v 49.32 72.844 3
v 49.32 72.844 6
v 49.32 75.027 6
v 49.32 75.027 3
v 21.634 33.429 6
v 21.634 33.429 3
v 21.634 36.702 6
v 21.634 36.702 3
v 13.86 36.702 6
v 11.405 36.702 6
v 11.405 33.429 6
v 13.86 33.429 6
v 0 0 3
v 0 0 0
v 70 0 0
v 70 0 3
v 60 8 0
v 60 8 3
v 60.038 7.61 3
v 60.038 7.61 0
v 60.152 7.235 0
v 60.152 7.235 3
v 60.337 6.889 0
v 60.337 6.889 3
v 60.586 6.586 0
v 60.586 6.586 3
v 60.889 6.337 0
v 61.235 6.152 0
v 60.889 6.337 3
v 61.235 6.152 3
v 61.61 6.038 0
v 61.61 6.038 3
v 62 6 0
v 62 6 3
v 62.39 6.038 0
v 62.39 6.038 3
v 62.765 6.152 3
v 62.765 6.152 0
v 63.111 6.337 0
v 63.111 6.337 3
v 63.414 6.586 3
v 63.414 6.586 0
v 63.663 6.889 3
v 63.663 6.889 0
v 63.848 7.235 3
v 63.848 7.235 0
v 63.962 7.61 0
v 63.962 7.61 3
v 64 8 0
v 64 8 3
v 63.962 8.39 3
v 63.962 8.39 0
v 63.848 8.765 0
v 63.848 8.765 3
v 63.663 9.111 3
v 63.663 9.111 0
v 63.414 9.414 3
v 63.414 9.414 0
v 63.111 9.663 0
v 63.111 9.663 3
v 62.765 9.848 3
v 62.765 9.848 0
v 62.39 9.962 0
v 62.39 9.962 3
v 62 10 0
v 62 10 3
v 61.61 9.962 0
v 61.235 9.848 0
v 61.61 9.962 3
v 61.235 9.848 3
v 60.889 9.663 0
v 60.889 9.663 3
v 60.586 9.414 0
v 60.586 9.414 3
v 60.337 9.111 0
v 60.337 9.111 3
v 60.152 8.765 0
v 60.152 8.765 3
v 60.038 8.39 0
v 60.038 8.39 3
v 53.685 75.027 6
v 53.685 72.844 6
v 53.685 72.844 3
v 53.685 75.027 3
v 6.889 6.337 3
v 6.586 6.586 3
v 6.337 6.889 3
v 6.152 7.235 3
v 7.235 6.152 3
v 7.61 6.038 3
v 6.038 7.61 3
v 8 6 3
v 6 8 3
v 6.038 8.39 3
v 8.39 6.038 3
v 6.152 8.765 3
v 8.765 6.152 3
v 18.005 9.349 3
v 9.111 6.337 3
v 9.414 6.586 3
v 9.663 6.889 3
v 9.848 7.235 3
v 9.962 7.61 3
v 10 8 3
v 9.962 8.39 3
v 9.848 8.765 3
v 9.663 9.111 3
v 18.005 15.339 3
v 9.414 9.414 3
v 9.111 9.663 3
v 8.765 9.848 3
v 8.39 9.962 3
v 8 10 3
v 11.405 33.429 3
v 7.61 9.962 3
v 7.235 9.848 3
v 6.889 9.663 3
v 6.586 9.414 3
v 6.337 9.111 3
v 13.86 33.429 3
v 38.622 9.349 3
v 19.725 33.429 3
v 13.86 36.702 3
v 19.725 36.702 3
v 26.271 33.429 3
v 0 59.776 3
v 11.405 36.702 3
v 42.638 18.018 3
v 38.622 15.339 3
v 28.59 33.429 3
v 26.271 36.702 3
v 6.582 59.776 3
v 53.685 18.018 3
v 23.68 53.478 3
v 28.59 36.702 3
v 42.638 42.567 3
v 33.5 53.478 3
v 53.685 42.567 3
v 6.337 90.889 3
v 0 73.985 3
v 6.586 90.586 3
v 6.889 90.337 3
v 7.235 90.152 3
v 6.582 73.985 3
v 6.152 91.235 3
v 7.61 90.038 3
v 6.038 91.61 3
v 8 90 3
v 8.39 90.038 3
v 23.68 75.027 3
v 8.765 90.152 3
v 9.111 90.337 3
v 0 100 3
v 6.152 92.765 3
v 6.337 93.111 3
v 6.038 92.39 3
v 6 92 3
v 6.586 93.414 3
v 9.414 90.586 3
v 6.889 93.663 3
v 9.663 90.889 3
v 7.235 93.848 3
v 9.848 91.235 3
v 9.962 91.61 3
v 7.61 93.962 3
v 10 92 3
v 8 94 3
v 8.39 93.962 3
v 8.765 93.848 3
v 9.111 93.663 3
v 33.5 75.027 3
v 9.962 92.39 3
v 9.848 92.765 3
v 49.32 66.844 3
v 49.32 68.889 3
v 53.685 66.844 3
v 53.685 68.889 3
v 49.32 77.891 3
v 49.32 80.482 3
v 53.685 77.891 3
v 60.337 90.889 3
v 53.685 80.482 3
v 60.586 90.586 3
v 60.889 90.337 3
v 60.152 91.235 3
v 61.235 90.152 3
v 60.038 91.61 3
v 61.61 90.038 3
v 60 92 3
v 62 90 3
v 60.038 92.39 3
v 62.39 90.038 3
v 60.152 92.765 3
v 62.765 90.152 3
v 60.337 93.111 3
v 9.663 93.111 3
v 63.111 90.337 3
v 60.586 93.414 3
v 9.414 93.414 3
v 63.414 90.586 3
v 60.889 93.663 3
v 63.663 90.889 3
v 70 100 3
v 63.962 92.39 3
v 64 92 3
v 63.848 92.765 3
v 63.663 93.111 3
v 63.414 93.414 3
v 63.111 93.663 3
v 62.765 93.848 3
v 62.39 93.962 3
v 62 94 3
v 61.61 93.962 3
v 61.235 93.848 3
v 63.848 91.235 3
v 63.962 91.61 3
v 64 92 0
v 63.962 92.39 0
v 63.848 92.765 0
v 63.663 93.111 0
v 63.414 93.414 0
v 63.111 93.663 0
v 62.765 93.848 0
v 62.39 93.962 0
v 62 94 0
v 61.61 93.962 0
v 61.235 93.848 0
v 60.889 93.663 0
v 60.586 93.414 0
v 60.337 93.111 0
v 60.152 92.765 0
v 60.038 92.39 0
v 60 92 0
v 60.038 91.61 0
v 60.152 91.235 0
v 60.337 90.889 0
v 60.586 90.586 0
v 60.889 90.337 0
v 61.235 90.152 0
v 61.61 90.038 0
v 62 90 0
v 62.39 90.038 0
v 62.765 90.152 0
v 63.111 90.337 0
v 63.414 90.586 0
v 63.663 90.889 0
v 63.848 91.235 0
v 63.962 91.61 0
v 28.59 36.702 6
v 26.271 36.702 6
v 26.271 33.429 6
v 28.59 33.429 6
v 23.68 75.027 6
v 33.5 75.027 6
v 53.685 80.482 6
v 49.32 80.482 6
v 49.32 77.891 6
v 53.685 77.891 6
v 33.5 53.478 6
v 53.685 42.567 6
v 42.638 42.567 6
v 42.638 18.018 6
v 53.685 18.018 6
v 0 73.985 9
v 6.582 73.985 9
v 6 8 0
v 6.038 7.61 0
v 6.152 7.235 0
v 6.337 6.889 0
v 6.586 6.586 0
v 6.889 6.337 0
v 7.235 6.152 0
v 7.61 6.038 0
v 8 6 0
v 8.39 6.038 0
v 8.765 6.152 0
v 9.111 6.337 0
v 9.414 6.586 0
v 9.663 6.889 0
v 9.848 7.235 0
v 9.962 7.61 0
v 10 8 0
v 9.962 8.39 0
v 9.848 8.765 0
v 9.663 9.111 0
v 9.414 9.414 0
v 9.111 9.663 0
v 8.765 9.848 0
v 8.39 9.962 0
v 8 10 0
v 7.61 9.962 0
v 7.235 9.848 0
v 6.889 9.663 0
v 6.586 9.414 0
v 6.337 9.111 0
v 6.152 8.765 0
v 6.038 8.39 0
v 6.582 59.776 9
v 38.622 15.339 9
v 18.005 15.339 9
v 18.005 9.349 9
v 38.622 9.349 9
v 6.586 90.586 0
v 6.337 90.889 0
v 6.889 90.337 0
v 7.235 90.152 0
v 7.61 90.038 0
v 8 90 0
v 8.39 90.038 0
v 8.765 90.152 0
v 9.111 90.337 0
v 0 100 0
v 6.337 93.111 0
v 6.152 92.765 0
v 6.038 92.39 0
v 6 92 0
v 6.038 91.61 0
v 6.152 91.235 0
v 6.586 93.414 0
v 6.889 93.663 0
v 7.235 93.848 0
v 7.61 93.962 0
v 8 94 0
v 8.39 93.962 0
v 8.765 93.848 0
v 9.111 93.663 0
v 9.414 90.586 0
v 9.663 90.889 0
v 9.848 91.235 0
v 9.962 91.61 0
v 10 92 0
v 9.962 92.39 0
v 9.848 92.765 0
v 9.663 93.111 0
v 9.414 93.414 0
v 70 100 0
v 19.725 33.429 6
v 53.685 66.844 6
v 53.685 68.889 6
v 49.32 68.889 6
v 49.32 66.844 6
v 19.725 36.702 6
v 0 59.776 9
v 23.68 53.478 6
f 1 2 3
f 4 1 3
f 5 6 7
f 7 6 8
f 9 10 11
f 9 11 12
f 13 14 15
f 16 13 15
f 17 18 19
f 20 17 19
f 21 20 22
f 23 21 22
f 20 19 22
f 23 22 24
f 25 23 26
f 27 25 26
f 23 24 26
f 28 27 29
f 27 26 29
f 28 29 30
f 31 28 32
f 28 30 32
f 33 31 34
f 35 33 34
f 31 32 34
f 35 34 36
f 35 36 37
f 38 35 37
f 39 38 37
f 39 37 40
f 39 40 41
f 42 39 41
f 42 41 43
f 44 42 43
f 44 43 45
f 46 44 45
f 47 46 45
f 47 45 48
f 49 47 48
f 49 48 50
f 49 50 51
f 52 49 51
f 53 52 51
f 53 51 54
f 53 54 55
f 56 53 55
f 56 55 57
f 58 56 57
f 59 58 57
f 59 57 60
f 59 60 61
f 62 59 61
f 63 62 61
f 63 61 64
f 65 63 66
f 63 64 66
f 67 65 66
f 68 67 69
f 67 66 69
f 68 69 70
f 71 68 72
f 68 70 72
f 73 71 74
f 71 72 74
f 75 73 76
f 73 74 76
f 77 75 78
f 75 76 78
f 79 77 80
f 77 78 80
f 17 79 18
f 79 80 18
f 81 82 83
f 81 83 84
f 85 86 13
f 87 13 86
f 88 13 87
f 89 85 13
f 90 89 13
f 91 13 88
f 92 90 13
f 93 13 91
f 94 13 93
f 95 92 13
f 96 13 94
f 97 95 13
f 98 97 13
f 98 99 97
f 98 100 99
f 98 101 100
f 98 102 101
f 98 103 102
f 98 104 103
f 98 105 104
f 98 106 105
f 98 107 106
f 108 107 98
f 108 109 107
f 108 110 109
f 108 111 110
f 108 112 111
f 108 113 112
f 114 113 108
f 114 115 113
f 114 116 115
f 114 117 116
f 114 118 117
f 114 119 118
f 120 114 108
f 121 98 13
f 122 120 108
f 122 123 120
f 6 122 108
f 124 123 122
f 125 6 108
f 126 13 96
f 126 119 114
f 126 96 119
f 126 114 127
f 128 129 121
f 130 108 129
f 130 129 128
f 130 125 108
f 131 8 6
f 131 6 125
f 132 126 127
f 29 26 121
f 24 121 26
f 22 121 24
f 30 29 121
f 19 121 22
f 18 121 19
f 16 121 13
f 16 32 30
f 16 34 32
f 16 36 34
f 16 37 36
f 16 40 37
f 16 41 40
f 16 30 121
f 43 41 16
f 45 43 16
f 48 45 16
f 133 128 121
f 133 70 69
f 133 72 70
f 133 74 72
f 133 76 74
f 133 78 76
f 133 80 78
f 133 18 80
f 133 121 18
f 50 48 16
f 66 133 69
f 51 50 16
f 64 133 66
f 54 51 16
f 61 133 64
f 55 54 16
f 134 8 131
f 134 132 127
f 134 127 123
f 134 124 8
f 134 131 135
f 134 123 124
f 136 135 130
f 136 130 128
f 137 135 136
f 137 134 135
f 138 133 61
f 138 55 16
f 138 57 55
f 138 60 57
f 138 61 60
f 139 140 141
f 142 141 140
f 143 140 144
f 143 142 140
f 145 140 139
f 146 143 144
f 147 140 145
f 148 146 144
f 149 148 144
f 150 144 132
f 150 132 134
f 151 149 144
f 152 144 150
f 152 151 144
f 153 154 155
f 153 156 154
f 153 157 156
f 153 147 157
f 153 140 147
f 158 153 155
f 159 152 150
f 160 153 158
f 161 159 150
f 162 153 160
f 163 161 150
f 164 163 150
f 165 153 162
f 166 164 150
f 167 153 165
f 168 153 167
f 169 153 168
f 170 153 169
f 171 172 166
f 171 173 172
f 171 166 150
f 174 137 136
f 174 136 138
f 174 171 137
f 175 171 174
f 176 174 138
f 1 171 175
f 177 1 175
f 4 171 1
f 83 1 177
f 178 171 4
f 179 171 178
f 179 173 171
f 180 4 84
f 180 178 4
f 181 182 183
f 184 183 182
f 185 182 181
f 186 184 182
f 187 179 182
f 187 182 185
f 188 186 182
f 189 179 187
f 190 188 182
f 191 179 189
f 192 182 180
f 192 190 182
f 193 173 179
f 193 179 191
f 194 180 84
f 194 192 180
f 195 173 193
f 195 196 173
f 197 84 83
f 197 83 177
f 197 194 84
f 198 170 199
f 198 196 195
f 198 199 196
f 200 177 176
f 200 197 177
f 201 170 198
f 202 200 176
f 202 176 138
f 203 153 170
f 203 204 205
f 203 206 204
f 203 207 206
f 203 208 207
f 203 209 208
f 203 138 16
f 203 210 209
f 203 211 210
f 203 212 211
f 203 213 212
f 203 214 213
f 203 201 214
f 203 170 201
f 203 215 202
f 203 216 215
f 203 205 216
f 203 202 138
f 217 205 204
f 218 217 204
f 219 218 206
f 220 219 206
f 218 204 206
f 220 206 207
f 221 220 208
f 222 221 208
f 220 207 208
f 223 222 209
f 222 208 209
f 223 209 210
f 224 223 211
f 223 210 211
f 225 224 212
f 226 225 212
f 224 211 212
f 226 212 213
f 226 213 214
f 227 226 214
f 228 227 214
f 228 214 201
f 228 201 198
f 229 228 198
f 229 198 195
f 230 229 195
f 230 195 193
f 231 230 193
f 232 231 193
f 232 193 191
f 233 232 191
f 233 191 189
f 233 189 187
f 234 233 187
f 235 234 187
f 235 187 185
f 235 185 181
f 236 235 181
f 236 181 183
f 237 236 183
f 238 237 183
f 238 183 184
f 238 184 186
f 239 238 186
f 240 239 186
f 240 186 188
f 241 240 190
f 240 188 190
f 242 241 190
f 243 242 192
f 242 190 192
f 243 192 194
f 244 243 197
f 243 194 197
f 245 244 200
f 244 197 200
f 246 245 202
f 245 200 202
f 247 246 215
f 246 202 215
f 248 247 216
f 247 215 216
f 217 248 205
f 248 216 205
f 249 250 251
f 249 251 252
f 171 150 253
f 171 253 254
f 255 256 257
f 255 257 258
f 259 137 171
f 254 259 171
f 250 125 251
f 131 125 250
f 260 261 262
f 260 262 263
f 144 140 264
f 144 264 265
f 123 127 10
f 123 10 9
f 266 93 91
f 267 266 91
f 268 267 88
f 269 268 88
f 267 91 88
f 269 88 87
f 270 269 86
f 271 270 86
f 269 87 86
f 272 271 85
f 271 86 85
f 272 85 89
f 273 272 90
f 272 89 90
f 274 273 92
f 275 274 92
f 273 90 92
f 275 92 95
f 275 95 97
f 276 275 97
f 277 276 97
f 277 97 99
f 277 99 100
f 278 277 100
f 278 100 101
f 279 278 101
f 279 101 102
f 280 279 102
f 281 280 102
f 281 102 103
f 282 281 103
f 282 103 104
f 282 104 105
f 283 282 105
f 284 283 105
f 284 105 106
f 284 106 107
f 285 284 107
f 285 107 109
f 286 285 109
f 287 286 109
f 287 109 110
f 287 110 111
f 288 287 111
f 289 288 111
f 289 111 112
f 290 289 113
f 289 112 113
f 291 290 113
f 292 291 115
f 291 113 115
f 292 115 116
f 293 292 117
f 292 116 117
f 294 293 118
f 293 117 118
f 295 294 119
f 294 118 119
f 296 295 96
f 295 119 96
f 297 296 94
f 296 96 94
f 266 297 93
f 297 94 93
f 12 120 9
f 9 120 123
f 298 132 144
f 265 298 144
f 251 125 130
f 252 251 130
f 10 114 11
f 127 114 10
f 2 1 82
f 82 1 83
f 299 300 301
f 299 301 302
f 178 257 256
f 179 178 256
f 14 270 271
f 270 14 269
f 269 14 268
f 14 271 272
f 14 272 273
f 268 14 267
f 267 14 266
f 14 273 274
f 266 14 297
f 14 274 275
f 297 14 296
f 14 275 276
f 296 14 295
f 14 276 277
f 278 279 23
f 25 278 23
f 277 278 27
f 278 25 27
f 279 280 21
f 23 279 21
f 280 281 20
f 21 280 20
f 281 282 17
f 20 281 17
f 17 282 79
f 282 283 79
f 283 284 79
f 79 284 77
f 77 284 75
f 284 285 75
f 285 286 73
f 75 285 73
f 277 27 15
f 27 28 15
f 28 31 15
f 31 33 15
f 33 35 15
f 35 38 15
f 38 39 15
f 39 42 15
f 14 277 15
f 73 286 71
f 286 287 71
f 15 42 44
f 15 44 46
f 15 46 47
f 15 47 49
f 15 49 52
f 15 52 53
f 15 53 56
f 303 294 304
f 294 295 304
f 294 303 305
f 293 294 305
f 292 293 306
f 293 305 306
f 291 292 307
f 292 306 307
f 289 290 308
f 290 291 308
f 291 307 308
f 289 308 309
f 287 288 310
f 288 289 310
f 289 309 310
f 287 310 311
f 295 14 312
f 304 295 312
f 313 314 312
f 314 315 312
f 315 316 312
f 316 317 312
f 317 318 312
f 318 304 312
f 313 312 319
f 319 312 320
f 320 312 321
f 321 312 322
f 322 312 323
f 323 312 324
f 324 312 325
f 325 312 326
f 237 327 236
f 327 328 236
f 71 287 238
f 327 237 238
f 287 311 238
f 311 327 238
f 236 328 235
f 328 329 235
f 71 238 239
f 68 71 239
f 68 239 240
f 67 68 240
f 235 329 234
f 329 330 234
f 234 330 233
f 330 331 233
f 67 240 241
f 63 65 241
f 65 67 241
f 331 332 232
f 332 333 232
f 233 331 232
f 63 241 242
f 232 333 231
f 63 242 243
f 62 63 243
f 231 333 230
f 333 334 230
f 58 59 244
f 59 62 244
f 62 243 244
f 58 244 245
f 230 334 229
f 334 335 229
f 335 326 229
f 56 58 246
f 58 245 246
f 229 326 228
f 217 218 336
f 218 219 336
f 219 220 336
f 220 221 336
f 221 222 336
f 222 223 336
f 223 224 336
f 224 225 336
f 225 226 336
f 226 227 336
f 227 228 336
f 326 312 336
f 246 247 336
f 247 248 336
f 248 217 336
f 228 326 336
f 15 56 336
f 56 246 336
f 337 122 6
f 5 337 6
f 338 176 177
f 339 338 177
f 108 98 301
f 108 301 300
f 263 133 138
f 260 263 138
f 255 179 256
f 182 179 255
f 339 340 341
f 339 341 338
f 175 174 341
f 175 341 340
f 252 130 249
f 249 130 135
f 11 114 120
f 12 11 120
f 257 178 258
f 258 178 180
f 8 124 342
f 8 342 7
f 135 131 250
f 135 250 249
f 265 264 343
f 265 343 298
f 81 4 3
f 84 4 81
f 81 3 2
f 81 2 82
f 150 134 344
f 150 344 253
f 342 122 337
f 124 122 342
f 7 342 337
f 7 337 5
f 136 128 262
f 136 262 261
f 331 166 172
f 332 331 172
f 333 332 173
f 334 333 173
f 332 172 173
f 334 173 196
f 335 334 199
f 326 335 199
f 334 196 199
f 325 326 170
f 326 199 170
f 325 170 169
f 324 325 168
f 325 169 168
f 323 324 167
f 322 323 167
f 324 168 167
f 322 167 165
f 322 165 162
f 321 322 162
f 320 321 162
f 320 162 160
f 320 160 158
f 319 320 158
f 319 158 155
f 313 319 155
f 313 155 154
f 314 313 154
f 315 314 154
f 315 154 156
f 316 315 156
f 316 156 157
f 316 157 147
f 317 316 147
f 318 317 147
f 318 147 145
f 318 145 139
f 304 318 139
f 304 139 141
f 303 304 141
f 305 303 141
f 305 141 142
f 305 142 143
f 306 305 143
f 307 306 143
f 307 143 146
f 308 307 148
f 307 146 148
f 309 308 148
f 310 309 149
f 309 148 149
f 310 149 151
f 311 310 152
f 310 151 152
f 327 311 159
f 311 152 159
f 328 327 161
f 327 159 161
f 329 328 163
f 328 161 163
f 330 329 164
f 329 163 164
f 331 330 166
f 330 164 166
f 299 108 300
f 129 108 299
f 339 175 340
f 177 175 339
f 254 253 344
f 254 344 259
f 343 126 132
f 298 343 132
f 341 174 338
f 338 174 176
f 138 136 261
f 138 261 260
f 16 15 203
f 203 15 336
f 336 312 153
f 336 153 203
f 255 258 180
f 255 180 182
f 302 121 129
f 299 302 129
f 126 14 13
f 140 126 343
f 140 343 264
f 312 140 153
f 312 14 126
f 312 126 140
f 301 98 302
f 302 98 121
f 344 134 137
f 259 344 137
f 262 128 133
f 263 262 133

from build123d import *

# Parameters (mm, degrees)
SKETCH_1_W          = 70
SKETCH_1_H          = 100
EXTRUDE_1_DEPTH     = 3
SKETCH_2_R          = 2
CUT_EXTRUDE_1_DEPTH = 123.102416029
SKETCH_3_W          = 9.819716148
SKETCH_3_H          = 21.548821549
SKETCH_3_W_2        = 11.047180667
SKETCH_3_H_2        = 24.549290372
SKETCH_3_W_3        = 2.454929037
SKETCH_3_H_3        = 3.273238716
SKETCH_3_W_4        = 1.909389251
SKETCH_3_W_5        = 2.318544091
SKETCH_3_W_6        = 4.364318288
SKETCH_3_H_4        = 2.045774198
SKETCH_3_H_5        = 2.182159144
SKETCH_3_H_6        = 2.591313983
EXTRUDE_2_DEPTH     = 3
SKETCH_4_W          = 6.582292946
SKETCH_4_H          = 14.208853527
SKETCH_4_W_2        = 20.616767863
SKETCH_4_H_2        = 5.990006879
EXTRUDE_3_DEPTH     = 6


with BuildPart() as part:
    # Эскиз1 → Бобышка-Вытянуть1 (new body)
    with BuildSketch(Plane.XY):
        with Locations((35, 50)):
            Rectangle(SKETCH_1_W, SKETCH_1_H)
    extrude(amount=EXTRUDE_1_DEPTH)

    # Эскиз2 → Вырез-Вытянуть1 (cut, through all)
    with BuildSketch(Plane.XY.offset(3)):
        with Locations((8, 92)):
            Circle(SKETCH_2_R)
        with Locations((62, 92)):
            Circle(SKETCH_2_R)
        with Locations(Location((62, 8, 0), (0, 0, 180))):
            Circle(SKETCH_2_R)
        with Locations(Location((8, 8, 0), (0, 0, 180))):
            Circle(SKETCH_2_R)
    extrude(amount=-CUT_EXTRUDE_1_DEPTH, mode=Mode.SUBTRACT)

    # Эскиз3 → Бобышка-Вытянуть2 (add)
    with BuildSketch(Plane.XY.offset(3)):
        with Locations((28.589907514, 64.252226911)):
            Rectangle(SKETCH_3_W, SKETCH_3_H)
        with Locations((48.161147339, 30.292375229)):
            Rectangle(SKETCH_3_W_2, SKETCH_3_H_2)
        with Locations((12.632868773, 35.065848357)):
            Rectangle(SKETCH_3_W_3, SKETCH_3_H_3)
        with Locations((20.679580617, 35.065848357)):
            Rectangle(SKETCH_3_W_4, SKETCH_3_H_3)
        with Locations((27.430635469, 35.065848357)):
            Rectangle(SKETCH_3_W_5, SKETCH_3_H_3)
        with Locations((51.502578528, 67.866427993)):
            Rectangle(SKETCH_3_W_6, SKETCH_3_H_4)
        with Locations((51.502578528, 73.935558113)):
            Rectangle(SKETCH_3_W_6, SKETCH_3_H_5)
        with Locations((51.502578528, 79.186378554)):
            Rectangle(SKETCH_3_W_6, SKETCH_3_H_6)
    extrude(amount=EXTRUDE_2_DEPTH)

    # Эскиз4 → Бобышка-Вытянуть3 (add)
    with BuildSketch(Plane.XY.offset(3)):
        with Locations((3.291146473, 66.880429277)):
            Rectangle(SKETCH_4_W, SKETCH_4_H)
        with Locations((28.313480694, 12.343506182)):
            Rectangle(SKETCH_4_W_2, SKETCH_4_H_2)
    extrude(amount=EXTRUDE_3_DEPTH)


solid = part.part
